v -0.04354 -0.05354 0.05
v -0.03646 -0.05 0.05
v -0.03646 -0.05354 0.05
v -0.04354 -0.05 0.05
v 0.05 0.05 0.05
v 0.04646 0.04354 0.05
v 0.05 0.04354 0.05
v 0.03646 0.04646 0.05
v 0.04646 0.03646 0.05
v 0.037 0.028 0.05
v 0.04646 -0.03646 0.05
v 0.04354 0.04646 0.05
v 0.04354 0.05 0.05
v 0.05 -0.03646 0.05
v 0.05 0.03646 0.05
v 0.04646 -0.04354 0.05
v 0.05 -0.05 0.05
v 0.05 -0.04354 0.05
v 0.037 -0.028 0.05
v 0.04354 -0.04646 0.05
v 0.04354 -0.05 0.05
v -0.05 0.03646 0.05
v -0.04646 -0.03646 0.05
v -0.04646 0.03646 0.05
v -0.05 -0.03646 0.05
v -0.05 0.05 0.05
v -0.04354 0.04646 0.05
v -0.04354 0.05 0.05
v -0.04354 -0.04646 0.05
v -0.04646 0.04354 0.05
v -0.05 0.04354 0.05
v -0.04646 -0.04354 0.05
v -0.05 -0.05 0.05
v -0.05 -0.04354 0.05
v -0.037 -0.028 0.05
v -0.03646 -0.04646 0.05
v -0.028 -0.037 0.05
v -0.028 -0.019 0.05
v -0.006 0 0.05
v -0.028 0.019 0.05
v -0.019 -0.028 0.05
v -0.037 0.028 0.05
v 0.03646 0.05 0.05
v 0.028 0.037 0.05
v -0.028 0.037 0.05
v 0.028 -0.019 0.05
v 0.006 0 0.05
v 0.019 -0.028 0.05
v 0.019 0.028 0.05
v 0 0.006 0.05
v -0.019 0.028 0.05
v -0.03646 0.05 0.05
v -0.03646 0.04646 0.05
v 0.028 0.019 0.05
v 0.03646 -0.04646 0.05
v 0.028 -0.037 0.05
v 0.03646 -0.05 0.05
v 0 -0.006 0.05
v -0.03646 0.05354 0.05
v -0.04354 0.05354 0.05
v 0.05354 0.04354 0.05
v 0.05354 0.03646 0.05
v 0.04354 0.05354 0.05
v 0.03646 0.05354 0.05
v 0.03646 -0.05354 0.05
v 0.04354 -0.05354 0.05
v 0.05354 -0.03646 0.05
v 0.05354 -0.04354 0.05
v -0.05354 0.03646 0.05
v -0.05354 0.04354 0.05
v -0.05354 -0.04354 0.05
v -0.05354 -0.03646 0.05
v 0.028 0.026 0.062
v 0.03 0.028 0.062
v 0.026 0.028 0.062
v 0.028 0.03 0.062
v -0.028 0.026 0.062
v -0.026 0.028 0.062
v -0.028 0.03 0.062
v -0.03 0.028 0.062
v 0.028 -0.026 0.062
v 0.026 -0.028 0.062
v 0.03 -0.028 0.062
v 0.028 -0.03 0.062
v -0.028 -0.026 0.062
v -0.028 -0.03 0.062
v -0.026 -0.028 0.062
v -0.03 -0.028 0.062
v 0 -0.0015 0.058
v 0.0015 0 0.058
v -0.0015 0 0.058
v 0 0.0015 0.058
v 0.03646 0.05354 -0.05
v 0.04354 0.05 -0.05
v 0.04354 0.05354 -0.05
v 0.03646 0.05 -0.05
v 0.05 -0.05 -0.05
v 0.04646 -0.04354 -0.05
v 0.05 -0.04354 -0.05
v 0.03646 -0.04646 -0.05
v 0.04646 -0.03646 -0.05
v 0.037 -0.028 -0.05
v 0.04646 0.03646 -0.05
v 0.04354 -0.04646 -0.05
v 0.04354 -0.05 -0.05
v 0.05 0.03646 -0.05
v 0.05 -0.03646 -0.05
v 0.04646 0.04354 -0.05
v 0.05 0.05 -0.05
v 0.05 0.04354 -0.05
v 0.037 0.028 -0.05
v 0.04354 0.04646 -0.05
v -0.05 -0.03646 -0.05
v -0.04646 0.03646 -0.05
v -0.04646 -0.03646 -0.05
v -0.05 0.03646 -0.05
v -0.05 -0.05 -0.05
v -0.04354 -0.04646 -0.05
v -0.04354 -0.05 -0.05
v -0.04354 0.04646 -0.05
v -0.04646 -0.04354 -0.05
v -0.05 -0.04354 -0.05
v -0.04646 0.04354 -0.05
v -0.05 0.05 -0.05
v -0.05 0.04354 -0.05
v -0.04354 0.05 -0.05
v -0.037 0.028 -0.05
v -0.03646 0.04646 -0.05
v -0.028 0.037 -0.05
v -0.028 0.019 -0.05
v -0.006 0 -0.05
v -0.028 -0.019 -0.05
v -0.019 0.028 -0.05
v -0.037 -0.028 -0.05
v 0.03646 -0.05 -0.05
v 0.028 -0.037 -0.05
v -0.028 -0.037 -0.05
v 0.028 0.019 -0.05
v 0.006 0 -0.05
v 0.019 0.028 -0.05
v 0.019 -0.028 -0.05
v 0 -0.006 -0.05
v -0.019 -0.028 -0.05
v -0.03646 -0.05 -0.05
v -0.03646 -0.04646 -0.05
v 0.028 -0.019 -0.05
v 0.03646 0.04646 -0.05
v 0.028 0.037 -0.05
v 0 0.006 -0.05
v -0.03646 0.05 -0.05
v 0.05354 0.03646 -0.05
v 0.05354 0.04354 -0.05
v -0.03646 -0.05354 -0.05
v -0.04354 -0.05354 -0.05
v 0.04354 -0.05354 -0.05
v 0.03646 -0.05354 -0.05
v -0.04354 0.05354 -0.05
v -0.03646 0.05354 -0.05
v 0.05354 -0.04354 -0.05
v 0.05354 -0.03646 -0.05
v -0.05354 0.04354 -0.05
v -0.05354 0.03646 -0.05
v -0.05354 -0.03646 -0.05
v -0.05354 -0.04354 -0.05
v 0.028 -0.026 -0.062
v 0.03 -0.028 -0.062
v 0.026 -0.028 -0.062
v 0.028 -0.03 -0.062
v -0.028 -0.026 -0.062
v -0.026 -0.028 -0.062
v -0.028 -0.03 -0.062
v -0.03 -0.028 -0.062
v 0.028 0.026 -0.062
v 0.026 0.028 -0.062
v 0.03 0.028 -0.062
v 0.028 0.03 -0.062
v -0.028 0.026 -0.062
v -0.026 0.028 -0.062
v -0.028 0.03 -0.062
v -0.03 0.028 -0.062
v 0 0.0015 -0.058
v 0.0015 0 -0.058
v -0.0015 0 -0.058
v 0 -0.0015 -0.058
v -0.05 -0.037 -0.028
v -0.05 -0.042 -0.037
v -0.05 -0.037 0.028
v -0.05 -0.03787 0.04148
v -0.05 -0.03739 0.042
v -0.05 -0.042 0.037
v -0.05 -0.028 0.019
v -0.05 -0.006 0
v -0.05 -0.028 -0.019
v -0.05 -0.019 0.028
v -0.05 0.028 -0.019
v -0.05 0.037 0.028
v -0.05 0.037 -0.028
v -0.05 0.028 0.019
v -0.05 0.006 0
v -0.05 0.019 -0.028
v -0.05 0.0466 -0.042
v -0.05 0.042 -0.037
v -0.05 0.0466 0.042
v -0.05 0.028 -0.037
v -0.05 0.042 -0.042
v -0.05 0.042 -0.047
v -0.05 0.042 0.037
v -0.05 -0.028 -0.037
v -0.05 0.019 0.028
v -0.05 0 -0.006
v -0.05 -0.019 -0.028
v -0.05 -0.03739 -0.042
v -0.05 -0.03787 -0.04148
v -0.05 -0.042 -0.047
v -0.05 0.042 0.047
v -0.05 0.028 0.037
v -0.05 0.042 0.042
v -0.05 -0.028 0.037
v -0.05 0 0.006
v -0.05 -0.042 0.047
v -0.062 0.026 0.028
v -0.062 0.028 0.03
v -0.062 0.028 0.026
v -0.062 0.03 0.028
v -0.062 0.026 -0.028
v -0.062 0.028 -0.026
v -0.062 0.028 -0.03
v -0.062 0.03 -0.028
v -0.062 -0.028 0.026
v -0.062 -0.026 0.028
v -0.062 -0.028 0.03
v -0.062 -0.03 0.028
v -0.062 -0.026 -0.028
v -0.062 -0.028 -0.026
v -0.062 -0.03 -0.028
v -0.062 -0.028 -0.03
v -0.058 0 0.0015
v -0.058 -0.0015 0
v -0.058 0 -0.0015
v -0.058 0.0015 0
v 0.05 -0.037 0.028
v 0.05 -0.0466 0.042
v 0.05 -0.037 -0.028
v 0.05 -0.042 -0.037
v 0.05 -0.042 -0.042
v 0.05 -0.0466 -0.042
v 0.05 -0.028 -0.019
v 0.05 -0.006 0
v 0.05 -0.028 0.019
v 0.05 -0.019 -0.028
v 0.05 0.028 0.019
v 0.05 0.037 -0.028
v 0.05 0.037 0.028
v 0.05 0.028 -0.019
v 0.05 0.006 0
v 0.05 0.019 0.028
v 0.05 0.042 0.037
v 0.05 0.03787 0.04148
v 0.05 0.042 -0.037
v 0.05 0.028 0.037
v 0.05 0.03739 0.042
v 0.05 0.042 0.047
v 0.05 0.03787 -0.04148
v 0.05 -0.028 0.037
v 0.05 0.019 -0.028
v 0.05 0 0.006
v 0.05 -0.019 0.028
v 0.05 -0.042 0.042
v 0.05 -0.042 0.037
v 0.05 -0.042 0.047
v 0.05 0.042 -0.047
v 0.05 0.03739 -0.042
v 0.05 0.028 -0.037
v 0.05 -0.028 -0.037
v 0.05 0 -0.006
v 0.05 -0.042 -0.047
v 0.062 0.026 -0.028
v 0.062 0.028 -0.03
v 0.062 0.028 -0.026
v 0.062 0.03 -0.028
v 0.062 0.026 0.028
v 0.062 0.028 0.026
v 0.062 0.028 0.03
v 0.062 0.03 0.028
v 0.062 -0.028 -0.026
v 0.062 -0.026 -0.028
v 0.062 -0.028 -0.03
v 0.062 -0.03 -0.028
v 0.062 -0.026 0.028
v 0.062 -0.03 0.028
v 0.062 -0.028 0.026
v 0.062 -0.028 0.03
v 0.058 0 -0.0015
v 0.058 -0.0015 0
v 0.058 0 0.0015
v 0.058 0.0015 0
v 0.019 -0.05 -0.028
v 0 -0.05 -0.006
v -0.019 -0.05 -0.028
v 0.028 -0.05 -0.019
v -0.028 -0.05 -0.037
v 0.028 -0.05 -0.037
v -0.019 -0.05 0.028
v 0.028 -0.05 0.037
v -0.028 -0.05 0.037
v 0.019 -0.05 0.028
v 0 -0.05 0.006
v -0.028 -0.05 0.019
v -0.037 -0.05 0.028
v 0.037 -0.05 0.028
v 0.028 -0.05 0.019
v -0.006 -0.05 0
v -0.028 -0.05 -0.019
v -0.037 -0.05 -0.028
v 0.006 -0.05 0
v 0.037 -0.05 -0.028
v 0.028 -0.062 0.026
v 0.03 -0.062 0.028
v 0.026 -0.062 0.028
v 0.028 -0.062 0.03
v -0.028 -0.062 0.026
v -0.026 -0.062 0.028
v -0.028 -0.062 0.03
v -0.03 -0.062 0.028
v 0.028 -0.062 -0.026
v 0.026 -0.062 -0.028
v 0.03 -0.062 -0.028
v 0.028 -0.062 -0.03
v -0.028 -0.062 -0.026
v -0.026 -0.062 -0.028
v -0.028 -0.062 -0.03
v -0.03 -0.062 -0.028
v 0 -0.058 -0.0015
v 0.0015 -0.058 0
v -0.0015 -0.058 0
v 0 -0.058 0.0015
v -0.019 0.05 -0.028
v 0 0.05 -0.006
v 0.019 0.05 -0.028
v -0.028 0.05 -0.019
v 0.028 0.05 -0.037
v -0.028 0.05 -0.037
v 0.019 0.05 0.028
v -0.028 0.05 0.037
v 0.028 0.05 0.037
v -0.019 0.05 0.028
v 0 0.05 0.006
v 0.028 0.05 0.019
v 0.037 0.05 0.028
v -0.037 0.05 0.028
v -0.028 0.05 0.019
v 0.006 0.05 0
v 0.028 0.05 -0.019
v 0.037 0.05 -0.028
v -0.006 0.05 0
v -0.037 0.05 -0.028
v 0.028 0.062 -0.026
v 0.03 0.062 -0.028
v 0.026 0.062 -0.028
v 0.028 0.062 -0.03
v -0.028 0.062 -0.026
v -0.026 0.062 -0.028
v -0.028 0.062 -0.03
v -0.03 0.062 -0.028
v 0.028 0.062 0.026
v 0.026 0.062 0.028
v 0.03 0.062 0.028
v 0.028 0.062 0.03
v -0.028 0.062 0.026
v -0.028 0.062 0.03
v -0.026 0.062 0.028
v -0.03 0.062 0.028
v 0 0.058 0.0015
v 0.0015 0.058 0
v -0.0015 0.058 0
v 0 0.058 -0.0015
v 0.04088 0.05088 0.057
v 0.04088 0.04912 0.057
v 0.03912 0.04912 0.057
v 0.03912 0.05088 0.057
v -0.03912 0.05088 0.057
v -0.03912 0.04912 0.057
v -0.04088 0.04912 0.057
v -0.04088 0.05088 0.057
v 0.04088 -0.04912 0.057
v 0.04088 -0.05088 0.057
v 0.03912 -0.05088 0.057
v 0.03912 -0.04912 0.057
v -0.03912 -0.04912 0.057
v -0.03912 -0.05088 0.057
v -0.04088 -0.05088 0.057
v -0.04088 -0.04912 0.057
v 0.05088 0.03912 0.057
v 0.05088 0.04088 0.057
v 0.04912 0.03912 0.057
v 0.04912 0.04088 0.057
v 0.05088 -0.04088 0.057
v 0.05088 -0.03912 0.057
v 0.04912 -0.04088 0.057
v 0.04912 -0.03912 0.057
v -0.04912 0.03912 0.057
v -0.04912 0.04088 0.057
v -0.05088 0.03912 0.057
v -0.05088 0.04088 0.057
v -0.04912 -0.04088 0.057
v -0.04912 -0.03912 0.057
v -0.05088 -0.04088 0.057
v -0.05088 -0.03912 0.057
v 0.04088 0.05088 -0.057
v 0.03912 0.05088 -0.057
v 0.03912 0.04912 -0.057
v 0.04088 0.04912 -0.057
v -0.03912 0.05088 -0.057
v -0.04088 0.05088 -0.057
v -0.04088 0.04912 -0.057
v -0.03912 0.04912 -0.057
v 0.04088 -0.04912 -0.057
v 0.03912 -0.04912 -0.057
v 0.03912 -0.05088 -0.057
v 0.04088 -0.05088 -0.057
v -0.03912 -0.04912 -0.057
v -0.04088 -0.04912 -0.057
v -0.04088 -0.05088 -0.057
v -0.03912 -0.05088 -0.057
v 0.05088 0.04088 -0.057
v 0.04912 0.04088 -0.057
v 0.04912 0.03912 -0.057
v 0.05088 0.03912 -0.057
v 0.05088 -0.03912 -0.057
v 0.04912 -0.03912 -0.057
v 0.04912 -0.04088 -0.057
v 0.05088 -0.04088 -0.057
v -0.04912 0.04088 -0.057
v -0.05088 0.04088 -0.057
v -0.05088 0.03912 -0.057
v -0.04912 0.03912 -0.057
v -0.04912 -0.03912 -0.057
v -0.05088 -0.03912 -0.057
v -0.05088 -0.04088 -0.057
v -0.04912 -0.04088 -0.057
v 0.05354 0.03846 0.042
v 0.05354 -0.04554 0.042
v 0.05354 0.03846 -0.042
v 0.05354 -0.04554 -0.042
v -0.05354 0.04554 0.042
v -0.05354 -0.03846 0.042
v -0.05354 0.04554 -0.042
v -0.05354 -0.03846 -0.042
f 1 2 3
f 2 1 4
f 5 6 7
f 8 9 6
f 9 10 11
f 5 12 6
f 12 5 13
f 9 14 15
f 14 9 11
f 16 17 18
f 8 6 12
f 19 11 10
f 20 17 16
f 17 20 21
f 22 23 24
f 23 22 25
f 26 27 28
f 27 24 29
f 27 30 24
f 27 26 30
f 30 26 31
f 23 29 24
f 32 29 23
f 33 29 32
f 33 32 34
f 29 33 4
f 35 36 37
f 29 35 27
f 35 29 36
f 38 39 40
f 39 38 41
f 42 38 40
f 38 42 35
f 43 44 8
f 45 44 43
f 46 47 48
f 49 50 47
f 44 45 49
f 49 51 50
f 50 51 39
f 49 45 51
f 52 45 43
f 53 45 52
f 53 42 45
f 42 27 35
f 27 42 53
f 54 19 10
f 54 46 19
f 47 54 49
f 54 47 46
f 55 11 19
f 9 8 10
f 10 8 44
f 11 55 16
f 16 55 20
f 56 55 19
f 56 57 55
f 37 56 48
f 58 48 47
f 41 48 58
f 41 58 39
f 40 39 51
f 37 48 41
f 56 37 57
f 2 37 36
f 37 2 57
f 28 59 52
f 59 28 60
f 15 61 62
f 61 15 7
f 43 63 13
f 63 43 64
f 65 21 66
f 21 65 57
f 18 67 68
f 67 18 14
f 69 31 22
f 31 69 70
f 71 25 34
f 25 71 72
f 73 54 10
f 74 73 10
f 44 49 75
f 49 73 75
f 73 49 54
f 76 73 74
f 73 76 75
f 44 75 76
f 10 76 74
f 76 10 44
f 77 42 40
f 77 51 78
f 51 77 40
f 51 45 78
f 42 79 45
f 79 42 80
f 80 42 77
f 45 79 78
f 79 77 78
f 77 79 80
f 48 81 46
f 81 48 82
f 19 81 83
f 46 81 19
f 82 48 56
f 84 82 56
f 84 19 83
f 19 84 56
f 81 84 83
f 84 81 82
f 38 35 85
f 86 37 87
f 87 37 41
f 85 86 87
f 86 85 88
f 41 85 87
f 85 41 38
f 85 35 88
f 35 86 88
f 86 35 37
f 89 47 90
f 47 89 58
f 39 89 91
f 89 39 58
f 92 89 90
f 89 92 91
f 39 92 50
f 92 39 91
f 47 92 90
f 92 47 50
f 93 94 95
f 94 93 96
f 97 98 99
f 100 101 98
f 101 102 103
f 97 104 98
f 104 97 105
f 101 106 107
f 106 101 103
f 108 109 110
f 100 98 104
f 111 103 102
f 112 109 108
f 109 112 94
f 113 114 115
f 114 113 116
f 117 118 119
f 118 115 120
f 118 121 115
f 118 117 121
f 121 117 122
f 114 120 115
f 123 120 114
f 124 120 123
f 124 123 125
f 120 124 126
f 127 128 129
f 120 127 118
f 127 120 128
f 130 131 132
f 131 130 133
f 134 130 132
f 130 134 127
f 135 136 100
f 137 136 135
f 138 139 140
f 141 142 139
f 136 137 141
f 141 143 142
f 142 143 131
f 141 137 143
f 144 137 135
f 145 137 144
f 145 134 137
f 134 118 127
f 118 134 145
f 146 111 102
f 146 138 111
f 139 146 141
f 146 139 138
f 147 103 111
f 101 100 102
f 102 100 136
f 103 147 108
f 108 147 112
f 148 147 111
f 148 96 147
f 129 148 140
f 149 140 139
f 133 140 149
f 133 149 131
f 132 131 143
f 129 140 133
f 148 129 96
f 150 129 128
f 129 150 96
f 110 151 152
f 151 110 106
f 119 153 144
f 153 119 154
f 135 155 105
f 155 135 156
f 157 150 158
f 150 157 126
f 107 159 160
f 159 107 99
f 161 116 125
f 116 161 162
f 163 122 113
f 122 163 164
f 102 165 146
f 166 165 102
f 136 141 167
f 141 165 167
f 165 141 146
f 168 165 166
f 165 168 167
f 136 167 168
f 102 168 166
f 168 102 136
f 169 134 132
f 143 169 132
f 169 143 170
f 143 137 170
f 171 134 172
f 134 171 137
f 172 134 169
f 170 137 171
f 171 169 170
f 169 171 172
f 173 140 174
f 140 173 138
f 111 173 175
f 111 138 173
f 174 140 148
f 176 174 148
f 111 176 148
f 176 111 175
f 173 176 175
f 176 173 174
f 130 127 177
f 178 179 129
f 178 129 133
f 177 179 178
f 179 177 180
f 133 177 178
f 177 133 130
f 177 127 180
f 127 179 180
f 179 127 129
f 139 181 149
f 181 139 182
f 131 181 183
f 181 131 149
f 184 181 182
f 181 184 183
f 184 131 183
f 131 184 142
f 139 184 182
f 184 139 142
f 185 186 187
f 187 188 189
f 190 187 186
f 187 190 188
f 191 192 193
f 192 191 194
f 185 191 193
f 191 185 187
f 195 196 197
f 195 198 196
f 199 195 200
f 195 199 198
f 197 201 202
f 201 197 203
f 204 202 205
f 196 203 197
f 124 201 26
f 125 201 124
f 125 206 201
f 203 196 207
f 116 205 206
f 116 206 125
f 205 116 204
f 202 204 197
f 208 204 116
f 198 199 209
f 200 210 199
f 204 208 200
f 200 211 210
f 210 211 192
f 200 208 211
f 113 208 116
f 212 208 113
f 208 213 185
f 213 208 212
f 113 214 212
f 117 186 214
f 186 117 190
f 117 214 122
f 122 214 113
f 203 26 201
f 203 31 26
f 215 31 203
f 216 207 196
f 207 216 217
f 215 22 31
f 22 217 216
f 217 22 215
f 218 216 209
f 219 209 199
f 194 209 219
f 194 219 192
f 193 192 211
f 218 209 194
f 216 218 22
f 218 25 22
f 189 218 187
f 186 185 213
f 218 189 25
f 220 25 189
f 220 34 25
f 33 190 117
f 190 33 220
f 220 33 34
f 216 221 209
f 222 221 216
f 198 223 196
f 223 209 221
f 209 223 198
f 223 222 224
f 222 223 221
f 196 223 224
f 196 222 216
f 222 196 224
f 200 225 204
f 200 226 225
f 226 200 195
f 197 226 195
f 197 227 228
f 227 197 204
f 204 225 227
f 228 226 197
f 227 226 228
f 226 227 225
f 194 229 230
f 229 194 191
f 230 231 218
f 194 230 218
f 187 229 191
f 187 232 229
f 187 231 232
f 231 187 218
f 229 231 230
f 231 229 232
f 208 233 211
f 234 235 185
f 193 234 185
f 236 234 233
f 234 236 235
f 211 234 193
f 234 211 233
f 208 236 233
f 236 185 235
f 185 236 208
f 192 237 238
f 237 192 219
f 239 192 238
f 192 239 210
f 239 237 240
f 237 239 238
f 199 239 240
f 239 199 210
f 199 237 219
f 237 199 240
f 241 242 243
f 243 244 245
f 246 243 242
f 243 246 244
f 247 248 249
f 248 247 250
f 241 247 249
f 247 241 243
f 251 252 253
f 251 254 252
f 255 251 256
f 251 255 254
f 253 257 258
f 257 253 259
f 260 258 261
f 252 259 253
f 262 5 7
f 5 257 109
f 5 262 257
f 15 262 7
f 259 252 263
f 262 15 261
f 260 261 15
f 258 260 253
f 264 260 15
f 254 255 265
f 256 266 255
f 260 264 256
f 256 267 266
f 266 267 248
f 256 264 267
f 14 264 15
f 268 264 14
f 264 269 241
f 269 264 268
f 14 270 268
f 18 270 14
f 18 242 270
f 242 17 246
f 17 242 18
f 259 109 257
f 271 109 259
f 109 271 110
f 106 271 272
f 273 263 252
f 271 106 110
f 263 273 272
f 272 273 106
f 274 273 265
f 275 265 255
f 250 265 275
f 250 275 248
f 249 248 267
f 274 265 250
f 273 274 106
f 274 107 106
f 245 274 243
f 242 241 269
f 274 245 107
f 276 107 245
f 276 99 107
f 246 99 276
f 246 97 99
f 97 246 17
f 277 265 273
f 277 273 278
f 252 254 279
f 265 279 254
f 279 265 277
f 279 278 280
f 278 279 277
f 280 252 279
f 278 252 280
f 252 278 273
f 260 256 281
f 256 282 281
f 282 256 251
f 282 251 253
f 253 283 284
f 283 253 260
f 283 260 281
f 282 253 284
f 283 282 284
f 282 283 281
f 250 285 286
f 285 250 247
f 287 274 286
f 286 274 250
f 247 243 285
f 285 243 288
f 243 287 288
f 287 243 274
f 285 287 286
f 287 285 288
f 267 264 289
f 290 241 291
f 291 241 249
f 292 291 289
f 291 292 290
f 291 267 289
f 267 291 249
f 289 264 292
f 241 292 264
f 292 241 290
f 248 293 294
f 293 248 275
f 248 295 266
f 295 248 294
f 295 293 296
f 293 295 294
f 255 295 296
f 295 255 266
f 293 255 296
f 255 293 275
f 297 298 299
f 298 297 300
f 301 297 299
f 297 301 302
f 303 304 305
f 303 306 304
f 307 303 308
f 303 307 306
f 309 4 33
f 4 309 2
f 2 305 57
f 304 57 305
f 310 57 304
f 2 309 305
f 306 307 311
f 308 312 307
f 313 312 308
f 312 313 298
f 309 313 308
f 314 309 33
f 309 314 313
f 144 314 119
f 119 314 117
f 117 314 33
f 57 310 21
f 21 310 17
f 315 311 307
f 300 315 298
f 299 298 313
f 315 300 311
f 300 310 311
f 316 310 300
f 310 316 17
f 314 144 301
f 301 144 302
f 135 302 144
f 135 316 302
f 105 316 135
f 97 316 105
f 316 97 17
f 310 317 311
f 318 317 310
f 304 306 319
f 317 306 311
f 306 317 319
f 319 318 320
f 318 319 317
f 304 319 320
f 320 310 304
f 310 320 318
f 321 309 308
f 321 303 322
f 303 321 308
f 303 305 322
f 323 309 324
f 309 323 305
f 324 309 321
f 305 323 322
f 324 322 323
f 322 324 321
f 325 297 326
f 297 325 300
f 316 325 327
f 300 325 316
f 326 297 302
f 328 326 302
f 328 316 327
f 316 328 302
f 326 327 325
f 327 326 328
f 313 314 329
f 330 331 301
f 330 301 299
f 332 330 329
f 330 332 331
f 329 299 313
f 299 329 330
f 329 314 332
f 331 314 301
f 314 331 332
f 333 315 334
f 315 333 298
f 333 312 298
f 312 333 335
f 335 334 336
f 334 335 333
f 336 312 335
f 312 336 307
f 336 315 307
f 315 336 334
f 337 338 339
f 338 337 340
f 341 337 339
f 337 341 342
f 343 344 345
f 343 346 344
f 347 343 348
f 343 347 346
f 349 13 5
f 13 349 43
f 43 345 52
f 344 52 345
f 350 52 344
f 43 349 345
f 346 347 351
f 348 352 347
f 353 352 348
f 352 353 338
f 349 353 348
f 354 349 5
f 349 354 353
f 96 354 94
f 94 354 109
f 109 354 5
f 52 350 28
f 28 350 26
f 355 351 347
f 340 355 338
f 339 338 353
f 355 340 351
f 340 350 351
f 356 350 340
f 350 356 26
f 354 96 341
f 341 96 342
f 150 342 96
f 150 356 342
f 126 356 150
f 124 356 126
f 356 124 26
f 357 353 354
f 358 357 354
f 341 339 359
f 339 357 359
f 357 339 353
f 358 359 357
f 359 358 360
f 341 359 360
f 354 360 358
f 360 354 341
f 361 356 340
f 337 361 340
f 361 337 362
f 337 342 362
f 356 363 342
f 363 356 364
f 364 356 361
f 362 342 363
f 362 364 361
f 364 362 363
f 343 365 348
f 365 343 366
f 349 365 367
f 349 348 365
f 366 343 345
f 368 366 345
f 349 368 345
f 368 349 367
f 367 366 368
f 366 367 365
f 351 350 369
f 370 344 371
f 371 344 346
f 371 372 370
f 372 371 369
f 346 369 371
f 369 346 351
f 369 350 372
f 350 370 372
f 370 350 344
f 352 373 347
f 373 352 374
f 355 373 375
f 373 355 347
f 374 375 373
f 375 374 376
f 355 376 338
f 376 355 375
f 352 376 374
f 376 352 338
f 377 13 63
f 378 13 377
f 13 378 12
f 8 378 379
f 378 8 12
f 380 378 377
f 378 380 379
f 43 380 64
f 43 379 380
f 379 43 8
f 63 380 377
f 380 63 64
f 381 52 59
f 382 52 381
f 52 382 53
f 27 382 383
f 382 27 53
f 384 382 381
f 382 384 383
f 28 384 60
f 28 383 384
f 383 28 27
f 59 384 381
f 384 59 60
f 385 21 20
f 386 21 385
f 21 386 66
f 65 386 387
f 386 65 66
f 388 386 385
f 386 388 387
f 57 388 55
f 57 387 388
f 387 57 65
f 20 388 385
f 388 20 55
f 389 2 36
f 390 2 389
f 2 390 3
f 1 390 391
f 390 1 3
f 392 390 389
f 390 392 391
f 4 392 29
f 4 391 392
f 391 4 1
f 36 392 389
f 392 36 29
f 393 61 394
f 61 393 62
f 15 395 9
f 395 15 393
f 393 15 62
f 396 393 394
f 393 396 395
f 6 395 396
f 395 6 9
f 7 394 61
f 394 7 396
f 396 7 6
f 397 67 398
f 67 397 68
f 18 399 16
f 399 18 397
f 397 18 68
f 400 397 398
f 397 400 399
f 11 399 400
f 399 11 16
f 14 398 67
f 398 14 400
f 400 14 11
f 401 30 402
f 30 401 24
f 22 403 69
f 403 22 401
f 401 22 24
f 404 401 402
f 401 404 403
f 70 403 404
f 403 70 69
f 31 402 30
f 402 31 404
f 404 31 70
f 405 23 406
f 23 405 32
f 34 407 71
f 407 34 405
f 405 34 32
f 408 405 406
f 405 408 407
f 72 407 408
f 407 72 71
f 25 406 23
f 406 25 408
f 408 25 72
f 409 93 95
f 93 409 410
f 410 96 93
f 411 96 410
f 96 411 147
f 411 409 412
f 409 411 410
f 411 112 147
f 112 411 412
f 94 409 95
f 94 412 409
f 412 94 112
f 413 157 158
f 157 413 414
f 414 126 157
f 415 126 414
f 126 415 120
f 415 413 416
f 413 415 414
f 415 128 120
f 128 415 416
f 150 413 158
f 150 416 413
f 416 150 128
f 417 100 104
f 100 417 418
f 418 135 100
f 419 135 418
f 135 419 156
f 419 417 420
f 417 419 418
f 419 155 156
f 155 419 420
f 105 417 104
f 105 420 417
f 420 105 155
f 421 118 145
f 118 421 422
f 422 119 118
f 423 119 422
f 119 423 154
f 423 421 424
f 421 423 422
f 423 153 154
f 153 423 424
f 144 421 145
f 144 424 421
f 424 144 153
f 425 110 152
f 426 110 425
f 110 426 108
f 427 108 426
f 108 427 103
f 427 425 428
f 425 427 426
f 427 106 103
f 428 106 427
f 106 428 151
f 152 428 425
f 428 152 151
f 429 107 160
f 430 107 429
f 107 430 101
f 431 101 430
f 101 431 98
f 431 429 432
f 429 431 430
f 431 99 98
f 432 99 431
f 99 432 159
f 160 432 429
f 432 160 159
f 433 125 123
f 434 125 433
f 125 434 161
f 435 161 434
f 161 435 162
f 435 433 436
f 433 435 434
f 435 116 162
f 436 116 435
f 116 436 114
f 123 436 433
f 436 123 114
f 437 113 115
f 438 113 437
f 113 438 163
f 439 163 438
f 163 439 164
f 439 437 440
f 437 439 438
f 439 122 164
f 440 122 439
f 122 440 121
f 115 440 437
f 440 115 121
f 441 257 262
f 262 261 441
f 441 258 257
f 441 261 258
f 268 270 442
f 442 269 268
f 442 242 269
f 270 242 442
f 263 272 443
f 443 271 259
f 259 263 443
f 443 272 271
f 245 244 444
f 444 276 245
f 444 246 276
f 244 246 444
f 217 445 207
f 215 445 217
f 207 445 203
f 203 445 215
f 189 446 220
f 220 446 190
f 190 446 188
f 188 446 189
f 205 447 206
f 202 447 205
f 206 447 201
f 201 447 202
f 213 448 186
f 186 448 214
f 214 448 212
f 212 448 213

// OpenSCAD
$fn=64;

size = 0.1;
half = size/2;

boss_h = 0.012;
boss_base = 0.018;
boss_top = 0.004;

boss_h_small = 0.008;
boss_base_small = 0.012;
boss_top_small = 0.003;

edge_boss_h = 0.007;
edge_boss_base = 0.010;
edge_boss_top = 0.0025;

module faceted_boss(h, b, t){
    linear_extrude(height=h, scale=t/b, convexity=10)
        circle(d=b, $fn=4);
}

module face_bosses(face="z+", inset=0.028){
    zoff = half;
    if(face=="z+"){
        translate([ inset,  inset, zoff]) faceted_boss(boss_h, boss_base, boss_top);
        translate([-inset,  inset, zoff]) faceted_boss(boss_h, boss_base, boss_top);
        translate([ inset, -inset, zoff]) faceted_boss(boss_h, boss_base, boss_top);
        translate([-inset, -inset, zoff]) faceted_boss(boss_h, boss_base, boss_top);
        translate([0,0,zoff]) faceted_boss(boss_h_small, boss_base_small, boss_top_small);
    } else if(face=="z-"){
        rotate([180,0,0]) face_bosses("z+");
    } else if(face=="x+"){
        rotate([0,-90,0]) face_bosses("z+");
    } else if(face=="x-"){
        rotate([0,90,0]) face_bosses("z+");
    } else if(face=="y+"){
        rotate([90,0,0]) face_bosses("z+");
    } else if(face=="y-"){
        rotate([-90,0,0]) face_bosses("z+");
    }
}

module edge_bosses(){
    e = 0.040;
    o = half;
    // Along edges near corners, on each face adjacency
    // Z+ edges
    translate([ e,  o,  o]) rotate([0,0,45]) faceted_boss(edge_boss_h, edge_boss_base, edge_boss_top);
    translate([-e,  o,  o]) rotate([0,0,45]) faceted_boss(edge_boss_h, edge_boss_base, edge_boss_top);
    translate([ e, -o,  o]) rotate([0,0,45]) faceted_boss(edge_boss_h, edge_boss_base, edge_boss_top);
    translate([-e, -o,  o]) rotate([0,0,45]) faceted_boss(edge_boss_h, edge_boss_base, edge_boss_top);

    translate([ o,  e,  o]) rotate([0,0,45]) faceted_boss(edge_boss_h, edge_boss_base, edge_boss_top);
    translate([ o, -e,  o]) rotate([0,0,45]) faceted_boss(edge_boss_h, edge_boss_base, edge_boss_top);
    translate([-o,  e,  o]) rotate([0,0,45]) faceted_boss(edge_boss_h, edge_boss_base, edge_boss_top);
    translate([-o, -e,  o]) rotate([0,0,45]) faceted_boss(edge_boss_h, edge_boss_base, edge_boss_top);

    // Z- edges
    translate([ e,  o, -o]) rotate([180,0,45]) faceted_boss(edge_boss_h, edge_boss_base, edge_boss_top);
    translate([-e,  o, -o]) rotate([180,0,45]) faceted_boss(edge_boss_h, edge_boss_base, edge_boss_top);
    translate([ e, -o, -o]) rotate([180,0,45]) faceted_boss(edge_boss_h, edge_boss_base, edge_boss_top);
    translate([-e, -o, -o]) rotate([180,0,45]) faceted_boss(edge_boss_h, edge_boss_base, edge_boss_top);

    translate([ o,  e, -o]) rotate([180,0,45]) faceted_boss(edge_boss_h, edge_boss_base, edge_boss_top);
    translate([ o, -e, -o]) rotate([180,0,45]) faceted_boss(edge_boss_h, edge_boss_base, edge_boss_top);
    translate([-o,  e, -o]) rotate([180,0,45]) faceted_boss(edge_boss_h, edge_boss_base, edge_boss_top);
    translate([-o, -e, -o]) rotate([180,0,45]) faceted_boss(edge_boss_h, edge_boss_base, edge_boss_top);

    // A few extra near corners on side faces
    c = 0.042;
    translate([ o,  c,  c]) rotate([0,-90,45]) faceted_boss(edge_boss_h, edge_boss_base, edge_boss_top);
    translate([ o, -c,  c]) rotate([0,-90,45]) faceted_boss(edge_boss_h, edge_boss_base, edge_boss_top);
    translate([ o,  c, -c]) rotate([0,-90,45]) faceted_boss(edge_boss_h, edge_boss_base, edge_boss_top);
    translate([ o, -c, -c]) rotate([0,-90,45]) faceted_boss(edge_boss_h, edge_boss_base, edge_boss_top);

    translate([-o,  c,  c]) rotate([0,90,45]) faceted_boss(edge_boss_h, edge_boss_base, edge_boss_top);
    translate([-o, -c,  c]) rotate([0,90,45]) faceted_boss(edge_boss_h, edge_boss_base, edge_boss_top);
    translate([-o,  c, -c]) rotate([0,90,45]) faceted_boss(edge_boss_h, edge_boss_base, edge_boss_top);
    translate([-o, -c, -c]) rotate([0,90,45]) faceted_boss(edge_boss_h, edge_boss_base, edge_boss_top);
}

module studded_cube(){
    union(){
        cube([size,size,size], center=true);
        face_bosses("z+");
        face_bosses("z-");
        face_bosses("x+");
        face_bosses("x-");
        face_bosses("y+");
        face_bosses("y-");
        edge_bosses();
    }
}

studded_cube();
